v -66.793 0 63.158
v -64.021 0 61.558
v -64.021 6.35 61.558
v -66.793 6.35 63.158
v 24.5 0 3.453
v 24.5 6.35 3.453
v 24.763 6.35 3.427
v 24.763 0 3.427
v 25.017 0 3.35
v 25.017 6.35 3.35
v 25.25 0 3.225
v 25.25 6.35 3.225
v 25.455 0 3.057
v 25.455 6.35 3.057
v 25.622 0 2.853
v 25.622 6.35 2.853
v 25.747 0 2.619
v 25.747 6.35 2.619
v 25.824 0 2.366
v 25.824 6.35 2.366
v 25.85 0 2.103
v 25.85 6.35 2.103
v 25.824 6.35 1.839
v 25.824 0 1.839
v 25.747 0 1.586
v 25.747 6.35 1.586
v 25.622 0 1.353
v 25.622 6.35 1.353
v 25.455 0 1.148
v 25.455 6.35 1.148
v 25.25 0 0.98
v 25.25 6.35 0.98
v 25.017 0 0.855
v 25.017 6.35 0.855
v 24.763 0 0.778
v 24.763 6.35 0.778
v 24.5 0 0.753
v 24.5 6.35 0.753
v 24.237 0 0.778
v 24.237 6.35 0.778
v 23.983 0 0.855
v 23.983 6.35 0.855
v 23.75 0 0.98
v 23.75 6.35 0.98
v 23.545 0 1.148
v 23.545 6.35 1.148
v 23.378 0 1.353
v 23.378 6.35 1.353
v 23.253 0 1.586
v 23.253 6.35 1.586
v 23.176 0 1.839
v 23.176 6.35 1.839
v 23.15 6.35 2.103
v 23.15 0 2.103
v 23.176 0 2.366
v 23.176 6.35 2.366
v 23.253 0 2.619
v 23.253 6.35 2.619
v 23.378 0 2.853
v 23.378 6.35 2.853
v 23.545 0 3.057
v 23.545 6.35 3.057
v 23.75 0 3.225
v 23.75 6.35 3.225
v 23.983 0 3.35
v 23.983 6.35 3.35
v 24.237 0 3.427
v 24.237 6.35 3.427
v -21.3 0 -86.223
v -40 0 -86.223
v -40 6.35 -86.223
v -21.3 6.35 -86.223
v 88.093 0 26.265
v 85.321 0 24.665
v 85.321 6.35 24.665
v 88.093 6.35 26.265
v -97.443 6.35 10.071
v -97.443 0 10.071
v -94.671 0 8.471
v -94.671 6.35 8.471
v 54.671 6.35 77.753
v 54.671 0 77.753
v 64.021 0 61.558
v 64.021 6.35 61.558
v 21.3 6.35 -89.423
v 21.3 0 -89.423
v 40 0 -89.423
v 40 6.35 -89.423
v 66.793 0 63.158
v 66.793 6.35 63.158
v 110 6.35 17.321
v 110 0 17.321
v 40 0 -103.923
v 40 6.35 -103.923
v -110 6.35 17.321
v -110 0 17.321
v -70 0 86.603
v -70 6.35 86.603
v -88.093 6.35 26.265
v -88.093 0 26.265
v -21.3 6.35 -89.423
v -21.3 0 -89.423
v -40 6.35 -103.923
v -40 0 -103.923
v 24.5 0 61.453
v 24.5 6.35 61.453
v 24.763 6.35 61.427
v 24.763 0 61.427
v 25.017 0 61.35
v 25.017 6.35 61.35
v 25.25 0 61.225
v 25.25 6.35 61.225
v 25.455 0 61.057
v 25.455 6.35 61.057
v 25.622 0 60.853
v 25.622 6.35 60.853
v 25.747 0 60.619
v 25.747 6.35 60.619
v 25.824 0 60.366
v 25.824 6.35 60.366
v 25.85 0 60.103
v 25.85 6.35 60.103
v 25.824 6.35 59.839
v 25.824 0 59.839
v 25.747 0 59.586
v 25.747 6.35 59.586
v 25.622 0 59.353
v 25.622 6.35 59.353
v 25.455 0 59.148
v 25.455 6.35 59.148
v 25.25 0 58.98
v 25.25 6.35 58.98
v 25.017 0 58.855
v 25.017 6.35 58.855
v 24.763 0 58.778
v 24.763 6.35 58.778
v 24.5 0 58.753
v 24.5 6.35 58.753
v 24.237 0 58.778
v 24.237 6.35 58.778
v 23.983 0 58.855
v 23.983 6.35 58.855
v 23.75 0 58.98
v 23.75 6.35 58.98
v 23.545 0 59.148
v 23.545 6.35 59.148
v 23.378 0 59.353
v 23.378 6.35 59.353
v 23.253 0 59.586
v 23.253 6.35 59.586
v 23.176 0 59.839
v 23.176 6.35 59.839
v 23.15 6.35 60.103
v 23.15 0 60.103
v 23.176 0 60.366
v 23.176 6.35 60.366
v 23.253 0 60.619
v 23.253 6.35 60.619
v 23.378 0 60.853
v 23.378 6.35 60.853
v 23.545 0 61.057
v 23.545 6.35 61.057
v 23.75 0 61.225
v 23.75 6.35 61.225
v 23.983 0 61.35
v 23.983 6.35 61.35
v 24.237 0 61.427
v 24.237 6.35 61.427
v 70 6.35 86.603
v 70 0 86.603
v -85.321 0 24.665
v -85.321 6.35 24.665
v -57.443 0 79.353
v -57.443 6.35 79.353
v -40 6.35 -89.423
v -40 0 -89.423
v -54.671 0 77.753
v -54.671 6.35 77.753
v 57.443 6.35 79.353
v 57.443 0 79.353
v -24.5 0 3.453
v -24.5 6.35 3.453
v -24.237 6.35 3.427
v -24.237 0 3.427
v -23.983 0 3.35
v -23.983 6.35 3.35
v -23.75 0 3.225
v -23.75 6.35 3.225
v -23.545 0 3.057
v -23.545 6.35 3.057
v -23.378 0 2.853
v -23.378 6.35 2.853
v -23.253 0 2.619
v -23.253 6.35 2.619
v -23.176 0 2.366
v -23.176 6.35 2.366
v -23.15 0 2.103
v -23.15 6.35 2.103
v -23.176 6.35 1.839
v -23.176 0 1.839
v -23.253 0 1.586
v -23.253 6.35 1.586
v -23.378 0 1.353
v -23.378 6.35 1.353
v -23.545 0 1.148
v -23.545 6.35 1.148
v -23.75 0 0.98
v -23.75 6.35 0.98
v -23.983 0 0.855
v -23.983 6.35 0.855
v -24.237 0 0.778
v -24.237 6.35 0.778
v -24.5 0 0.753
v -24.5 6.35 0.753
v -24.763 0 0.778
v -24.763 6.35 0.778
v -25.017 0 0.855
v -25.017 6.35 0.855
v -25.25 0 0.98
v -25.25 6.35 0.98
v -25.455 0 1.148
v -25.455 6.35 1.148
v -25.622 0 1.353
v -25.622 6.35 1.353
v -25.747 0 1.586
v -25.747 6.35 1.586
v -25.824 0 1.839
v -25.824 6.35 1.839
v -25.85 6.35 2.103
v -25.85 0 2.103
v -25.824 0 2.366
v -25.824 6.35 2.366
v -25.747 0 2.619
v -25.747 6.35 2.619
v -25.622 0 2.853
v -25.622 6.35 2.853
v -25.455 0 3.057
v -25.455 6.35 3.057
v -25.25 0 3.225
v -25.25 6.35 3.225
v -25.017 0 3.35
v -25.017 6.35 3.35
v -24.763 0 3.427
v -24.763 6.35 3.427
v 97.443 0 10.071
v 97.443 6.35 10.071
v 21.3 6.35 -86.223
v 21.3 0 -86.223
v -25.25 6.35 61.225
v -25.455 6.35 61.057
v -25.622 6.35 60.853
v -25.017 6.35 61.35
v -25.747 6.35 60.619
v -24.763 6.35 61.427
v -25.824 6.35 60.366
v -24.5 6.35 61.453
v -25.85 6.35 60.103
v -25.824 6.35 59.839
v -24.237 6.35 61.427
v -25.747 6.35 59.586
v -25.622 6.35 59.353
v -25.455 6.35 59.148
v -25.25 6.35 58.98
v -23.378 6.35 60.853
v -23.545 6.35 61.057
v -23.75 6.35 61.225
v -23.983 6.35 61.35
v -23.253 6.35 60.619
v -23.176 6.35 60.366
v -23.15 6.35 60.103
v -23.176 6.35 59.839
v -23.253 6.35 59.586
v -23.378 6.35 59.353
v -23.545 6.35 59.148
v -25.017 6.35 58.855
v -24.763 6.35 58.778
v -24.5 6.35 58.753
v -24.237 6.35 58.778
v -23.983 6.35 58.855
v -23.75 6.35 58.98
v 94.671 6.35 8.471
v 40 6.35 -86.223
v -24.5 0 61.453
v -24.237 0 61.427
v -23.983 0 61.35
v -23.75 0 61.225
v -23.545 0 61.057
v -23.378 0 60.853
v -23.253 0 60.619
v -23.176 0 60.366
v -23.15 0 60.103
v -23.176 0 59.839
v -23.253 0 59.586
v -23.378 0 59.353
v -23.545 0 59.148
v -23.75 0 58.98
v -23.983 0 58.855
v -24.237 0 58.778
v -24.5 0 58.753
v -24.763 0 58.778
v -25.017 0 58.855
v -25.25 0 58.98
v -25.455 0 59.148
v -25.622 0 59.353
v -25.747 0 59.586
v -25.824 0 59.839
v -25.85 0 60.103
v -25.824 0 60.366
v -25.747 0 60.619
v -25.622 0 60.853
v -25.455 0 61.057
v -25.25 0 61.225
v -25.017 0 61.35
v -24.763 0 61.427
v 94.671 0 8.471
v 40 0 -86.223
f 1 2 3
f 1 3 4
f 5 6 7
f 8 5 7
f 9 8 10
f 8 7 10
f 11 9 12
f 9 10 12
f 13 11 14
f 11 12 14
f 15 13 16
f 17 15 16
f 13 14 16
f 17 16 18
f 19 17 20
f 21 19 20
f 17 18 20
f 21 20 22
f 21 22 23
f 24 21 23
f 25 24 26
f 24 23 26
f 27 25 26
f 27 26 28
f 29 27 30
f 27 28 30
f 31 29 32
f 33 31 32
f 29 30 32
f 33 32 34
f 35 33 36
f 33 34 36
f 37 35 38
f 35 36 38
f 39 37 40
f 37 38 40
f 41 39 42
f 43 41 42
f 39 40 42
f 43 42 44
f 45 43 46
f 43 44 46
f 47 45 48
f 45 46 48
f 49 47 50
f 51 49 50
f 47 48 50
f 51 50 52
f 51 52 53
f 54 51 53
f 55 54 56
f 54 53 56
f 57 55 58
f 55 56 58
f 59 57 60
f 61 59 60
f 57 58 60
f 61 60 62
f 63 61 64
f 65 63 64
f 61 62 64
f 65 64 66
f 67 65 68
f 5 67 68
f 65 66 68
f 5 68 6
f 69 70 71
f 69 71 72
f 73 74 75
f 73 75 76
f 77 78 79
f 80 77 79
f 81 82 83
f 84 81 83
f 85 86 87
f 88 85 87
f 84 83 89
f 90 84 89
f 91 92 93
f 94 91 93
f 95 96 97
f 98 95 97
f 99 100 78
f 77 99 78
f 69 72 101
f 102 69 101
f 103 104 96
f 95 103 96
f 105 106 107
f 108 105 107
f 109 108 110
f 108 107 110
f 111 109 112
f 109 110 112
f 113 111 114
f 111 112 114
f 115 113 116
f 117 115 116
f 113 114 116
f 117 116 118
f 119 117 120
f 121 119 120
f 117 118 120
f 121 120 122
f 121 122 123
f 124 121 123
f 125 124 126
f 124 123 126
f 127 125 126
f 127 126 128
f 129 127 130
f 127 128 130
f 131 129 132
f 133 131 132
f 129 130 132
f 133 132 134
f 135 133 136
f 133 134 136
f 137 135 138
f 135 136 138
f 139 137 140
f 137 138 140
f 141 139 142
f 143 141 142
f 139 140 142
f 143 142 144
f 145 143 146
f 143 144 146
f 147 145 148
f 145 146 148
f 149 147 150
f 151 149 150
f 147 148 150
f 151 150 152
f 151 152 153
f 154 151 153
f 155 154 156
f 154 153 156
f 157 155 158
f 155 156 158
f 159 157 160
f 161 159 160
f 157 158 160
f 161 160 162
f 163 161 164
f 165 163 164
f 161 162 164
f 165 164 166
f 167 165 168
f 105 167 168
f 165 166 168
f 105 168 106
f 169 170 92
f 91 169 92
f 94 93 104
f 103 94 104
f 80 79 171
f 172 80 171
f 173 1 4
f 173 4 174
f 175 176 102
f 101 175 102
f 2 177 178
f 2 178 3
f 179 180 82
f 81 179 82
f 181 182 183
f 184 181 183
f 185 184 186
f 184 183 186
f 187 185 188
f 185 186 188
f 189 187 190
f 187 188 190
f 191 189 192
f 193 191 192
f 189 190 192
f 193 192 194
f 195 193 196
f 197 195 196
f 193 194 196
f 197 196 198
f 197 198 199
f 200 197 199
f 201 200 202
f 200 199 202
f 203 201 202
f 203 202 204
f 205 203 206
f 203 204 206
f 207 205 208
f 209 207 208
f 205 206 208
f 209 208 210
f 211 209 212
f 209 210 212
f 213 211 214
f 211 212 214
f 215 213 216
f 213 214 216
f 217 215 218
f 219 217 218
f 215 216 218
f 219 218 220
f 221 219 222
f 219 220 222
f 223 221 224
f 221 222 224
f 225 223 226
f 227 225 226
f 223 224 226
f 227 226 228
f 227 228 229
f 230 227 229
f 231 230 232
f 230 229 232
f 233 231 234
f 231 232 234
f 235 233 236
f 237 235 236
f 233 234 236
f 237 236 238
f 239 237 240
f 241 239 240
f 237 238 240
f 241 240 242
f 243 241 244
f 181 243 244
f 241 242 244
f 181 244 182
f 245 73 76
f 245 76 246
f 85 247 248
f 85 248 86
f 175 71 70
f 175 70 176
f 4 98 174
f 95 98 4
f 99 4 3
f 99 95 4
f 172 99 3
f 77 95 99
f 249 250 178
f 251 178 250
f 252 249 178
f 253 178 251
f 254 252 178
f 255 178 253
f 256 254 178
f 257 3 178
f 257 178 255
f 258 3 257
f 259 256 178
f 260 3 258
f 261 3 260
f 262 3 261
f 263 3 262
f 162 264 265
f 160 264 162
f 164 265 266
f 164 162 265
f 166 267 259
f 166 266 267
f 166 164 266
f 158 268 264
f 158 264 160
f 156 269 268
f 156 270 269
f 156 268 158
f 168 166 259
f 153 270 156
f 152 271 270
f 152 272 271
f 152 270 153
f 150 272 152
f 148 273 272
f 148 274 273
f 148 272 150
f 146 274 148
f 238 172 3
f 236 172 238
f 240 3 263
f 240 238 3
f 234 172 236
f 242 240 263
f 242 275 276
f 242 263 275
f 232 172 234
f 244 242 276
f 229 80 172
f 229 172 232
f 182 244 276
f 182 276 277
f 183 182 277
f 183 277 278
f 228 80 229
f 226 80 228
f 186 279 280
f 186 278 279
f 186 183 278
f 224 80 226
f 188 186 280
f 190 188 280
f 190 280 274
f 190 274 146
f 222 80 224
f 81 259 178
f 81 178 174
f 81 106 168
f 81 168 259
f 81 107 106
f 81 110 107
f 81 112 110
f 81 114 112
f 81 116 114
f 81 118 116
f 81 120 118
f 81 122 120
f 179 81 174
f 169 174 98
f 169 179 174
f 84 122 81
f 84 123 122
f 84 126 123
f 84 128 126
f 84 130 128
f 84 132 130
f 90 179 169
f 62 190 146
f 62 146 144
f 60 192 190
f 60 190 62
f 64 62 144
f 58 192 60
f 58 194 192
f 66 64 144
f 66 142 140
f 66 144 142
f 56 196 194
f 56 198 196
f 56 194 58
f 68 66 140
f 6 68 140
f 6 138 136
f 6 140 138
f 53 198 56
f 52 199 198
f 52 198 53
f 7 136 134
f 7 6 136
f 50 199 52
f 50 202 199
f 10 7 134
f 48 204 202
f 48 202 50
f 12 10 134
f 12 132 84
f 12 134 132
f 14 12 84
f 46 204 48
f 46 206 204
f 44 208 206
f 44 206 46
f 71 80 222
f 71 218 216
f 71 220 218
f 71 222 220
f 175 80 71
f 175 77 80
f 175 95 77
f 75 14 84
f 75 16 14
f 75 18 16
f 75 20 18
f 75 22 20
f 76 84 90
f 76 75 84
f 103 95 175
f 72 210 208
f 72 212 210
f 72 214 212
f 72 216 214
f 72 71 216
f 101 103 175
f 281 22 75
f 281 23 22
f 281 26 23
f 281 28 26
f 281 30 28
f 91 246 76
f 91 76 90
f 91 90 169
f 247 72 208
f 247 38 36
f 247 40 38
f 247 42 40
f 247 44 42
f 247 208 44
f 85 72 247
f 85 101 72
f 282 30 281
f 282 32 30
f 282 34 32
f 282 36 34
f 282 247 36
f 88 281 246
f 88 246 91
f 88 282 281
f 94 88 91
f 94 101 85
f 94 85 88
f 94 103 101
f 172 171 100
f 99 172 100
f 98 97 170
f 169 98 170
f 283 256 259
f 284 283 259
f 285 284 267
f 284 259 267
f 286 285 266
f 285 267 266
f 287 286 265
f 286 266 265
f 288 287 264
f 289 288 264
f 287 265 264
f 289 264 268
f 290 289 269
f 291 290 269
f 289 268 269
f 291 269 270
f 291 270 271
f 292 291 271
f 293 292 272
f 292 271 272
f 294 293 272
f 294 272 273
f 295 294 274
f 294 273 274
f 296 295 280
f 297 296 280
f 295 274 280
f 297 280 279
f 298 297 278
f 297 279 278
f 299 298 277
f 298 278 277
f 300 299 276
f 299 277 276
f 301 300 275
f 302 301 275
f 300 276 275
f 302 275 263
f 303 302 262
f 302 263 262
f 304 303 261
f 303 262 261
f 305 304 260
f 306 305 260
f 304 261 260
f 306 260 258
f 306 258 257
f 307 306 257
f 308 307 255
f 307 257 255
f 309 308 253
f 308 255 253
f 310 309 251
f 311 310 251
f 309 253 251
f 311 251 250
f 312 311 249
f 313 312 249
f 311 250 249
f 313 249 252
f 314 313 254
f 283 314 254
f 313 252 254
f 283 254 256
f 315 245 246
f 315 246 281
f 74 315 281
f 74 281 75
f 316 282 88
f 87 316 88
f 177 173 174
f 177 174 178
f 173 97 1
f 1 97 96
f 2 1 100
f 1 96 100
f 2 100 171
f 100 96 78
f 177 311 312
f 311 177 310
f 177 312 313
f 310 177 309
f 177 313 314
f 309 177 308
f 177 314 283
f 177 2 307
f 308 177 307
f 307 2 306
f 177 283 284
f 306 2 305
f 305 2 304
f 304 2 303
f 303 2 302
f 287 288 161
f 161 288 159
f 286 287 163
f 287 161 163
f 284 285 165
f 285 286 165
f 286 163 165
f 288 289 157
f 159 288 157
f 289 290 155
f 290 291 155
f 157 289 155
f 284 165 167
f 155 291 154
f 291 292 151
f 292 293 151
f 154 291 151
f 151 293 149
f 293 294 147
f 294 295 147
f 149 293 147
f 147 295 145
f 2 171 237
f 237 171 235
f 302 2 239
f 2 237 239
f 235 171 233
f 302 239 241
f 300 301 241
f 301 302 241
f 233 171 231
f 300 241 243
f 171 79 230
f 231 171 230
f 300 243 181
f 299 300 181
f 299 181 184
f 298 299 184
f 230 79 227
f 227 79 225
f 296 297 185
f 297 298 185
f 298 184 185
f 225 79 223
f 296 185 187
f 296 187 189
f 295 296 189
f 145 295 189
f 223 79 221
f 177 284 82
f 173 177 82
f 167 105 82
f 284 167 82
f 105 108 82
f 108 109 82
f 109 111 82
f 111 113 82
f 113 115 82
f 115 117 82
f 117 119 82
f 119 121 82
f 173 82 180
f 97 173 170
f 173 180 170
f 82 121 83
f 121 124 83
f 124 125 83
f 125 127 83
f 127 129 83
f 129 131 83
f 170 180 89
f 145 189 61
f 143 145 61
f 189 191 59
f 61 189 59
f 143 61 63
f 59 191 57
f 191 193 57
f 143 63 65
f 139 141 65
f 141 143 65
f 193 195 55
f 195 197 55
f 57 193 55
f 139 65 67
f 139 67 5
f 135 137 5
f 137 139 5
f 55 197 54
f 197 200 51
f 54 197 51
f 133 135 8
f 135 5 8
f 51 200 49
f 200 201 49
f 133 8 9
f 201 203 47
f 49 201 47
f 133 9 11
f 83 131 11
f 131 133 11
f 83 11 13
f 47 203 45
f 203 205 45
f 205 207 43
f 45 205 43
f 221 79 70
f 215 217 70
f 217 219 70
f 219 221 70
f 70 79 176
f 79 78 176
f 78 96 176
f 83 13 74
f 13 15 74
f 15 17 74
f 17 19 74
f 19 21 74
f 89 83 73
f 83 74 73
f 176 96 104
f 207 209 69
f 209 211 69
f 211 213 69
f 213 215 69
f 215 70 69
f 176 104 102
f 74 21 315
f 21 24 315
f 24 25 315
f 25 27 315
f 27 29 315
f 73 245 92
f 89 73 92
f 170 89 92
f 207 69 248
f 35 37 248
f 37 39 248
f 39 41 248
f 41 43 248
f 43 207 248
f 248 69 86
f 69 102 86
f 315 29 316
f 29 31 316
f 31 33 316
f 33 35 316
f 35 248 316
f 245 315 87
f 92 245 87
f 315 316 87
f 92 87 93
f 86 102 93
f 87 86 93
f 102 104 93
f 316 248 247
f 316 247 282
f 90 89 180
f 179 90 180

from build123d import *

# Parameters (mm, degrees)
SKETCH1_W           = 18.7
SKETCH1_H           = 3.2
BOSS_EXTRUDE1_DEPTH = 6.35
SKETCH2_R           = 1.35
CUT_EXTRUDE1_DEPTH  = 6.35


with BuildPart() as part:
    # Sketch1 → Boss-Extrude1 (new body)
    with BuildSketch(Plane(origin=(0, 0, 0), x_dir=(1, 0, 0), z_dir=(0, 1, 0))):
        Polygon((70, -86.602540378), (110, -17.320508076), (40, 103.923048454), (-40, 103.923048454), (-110, -17.320508076), (-70, -86.602540378), align=None)
        Polygon((-94.671350353, -8.470508076), (-85.321350353, -24.665183126), (-88.092631645, -26.265183126), (-97.442631645, -10.070508076), align=None, mode=Mode.SUBTRACT)
        Polygon((-57.442631645, -79.352540378), (-54.671350353, -77.752540378), (-64.021350353, -61.557865328), (-66.792631645, -63.157865328), align=None, mode=Mode.SUBTRACT)
        Polygon((54.671350353, -77.752540378), (64.021350353, -61.557865328), (66.792631645, -63.157865328), (57.442631645, -79.352540378), align=None, mode=Mode.SUBTRACT)
        Polygon((97.442631645, -10.070508076), (94.671350353, -8.470508076), (85.321350353, -24.665183126), (88.092631645, -26.265183126), align=None, mode=Mode.SUBTRACT)
        with Locations((30.65, 87.823048454)):
            Rectangle(SKETCH1_W, SKETCH1_H, mode=Mode.SUBTRACT)
        with Locations((-30.65, 87.823048454)):
            Rectangle(SKETCH1_W, SKETCH1_H, mode=Mode.SUBTRACT)
    extrude(amount=BOSS_EXTRUDE1_DEPTH)

    # Sketch2 → Cut-Extrude1 (cut)
    with BuildSketch(Plane(origin=(0, 6.35, 0), x_dir=(1, 0, 0), z_dir=(0, 1, 0))):
        with Locations(Location((-24.5, -60.102540378, 0), (0, 0, 270))):
            Circle(SKETCH2_R)
        with Locations(Location((24.5, -60.102540378, 0), (0, 0, 270))):
            Circle(SKETCH2_R)
        with Locations(Location((24.5, -2.102540378, 0), (0, 0, 270))):
            Circle(SKETCH2_R)
        with Locations(Location((-24.5, -2.102540378, 0), (0, 0, 270))):
            Circle(SKETCH2_R)
    extrude(amount=-CUT_EXTRUDE1_DEPTH, mode=Mode.SUBTRACT)


solid = part.part
